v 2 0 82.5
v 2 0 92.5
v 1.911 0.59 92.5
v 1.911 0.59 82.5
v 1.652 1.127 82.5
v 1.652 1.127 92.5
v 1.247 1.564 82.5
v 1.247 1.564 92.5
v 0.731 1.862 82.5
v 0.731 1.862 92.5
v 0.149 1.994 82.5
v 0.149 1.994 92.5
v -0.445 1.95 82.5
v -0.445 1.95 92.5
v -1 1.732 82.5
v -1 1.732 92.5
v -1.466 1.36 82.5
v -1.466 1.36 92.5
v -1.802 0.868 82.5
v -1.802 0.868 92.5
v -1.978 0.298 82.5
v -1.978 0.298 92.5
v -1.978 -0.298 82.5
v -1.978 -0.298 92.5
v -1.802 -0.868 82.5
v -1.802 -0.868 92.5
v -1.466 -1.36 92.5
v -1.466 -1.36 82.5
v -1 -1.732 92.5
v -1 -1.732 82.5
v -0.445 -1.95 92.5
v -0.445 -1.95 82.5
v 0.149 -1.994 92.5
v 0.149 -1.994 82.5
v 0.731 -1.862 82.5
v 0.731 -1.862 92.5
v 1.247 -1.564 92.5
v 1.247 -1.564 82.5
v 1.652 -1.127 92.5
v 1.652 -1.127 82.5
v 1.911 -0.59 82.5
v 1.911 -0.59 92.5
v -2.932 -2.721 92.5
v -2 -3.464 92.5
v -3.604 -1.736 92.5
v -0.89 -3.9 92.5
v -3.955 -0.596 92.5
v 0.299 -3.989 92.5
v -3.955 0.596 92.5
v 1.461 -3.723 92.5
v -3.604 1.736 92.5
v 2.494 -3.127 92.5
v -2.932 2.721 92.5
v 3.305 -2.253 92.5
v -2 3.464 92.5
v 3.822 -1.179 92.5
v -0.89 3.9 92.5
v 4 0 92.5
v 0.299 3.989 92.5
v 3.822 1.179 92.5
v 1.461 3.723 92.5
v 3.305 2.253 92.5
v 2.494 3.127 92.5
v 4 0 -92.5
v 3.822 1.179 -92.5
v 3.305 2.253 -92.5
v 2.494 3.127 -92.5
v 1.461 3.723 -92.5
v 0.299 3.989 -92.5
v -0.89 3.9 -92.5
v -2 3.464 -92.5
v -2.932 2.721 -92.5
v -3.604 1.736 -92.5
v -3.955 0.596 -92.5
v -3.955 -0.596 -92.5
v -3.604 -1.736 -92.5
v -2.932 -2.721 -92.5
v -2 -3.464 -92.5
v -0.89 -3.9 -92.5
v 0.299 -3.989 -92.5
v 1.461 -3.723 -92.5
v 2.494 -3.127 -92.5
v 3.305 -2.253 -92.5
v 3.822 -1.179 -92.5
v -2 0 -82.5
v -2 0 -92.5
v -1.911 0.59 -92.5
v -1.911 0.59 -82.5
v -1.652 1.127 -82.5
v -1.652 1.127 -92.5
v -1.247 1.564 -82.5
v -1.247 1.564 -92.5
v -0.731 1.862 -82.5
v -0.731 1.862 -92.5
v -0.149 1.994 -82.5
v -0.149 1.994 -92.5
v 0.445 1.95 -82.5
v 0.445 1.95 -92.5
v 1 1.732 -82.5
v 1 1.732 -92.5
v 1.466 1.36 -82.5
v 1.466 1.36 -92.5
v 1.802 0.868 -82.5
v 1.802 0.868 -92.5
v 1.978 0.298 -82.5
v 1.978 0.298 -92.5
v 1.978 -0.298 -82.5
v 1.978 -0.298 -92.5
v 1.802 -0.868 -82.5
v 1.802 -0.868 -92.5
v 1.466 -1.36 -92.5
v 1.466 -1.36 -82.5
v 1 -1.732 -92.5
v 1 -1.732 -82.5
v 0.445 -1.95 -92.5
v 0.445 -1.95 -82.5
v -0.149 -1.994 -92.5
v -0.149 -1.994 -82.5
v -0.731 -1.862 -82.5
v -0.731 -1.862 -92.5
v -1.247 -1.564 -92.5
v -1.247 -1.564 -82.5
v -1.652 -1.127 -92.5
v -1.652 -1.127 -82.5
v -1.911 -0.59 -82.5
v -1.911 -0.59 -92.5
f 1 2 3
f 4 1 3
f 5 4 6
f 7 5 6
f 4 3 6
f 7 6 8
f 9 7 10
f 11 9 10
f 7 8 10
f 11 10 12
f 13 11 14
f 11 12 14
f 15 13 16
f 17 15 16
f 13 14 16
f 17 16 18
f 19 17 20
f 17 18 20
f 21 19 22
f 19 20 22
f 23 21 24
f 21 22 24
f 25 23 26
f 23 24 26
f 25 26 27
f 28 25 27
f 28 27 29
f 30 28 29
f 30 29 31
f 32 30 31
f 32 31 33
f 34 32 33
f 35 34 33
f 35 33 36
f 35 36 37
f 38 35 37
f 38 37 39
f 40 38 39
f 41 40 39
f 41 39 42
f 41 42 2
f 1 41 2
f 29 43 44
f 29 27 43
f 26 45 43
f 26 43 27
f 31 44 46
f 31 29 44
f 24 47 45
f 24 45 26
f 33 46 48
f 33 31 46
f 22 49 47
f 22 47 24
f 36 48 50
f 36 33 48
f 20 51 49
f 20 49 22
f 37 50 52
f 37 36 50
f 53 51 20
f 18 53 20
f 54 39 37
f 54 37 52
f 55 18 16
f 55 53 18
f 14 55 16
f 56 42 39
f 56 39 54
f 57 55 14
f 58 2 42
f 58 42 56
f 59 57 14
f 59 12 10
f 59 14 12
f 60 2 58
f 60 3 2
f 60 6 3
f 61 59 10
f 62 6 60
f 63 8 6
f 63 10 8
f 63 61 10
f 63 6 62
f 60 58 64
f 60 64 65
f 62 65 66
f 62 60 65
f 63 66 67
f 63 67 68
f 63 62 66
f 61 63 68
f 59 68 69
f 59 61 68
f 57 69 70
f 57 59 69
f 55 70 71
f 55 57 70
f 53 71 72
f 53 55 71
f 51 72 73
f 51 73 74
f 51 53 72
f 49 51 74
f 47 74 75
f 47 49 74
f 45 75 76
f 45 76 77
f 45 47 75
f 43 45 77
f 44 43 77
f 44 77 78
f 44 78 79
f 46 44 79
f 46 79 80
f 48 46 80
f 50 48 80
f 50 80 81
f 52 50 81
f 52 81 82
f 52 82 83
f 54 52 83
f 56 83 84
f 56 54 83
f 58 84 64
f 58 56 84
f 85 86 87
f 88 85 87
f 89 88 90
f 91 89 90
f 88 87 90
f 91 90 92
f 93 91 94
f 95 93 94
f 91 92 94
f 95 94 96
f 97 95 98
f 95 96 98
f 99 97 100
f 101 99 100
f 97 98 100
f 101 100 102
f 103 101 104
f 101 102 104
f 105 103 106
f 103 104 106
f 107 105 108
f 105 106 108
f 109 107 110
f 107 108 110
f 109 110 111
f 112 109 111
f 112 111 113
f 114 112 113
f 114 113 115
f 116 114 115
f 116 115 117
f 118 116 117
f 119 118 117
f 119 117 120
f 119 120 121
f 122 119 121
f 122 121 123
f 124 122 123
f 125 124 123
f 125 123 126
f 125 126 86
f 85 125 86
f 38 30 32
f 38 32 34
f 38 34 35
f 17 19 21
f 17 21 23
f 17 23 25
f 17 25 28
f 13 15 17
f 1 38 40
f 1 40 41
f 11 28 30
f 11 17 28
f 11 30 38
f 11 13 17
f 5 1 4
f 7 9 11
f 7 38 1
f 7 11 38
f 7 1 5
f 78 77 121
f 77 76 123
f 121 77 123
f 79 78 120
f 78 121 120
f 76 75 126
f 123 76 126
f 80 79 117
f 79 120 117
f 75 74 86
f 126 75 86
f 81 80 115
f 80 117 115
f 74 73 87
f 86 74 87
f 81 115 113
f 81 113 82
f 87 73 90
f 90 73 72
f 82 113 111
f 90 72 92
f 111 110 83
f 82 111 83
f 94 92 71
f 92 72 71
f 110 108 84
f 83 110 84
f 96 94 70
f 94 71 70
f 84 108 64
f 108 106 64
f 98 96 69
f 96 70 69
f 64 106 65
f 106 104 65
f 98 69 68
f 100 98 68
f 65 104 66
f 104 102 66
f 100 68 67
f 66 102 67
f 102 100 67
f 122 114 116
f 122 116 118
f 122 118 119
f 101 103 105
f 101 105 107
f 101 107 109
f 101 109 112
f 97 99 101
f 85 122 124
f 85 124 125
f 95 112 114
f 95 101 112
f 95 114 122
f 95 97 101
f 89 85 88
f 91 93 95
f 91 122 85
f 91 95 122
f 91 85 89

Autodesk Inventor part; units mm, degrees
ref_plane "YZ Plane" through (0, 0, 0) normal (1, 0, 0) x (0, 1, 0)
ref_plane "XZ Plane" through (0, 0, 0) normal (0, 1, 0) x (-1, 0, 0)
ref_plane "XY Plane" through (0, 0, 0) normal (0, 0, 1) x (1, 0, 0)
sketch "スケッチ1" plane through (0, 0, 0) normal (0, 0, 1) x (1, 0, 0)
  circle A0 centre (0, 0) radius 2
  circle A1 centre (0, 0) radius 4
  dimension "d0" = 4
  dimension "d1" = 8
extrude "押し出し1" add sketch "スケッチ1" along normal mid plane 185 contours A0 | A1
sketch "スケッチ3" plane through (0, 0, 92.5) normal (0, 0, 1) x (1, 0, 0)
  circle A0 centre (0, 0) radius 2
  dimension "d5" = 4
extrude "押し出し2" cut sketch "スケッチ3" against normal blind 10
sketch "スケッチ4" plane through (0, 0, -92.5) normal (0, 0, -1) x (-1, 0, 0)
  circle A0 centre (0, 0) radius 2
  dimension "d8" = 4
extrude "押し出し3" cut sketch "スケッチ4" against normal blind 10
properties part number "シャフト185mm" material "アルミニウム 7075"
